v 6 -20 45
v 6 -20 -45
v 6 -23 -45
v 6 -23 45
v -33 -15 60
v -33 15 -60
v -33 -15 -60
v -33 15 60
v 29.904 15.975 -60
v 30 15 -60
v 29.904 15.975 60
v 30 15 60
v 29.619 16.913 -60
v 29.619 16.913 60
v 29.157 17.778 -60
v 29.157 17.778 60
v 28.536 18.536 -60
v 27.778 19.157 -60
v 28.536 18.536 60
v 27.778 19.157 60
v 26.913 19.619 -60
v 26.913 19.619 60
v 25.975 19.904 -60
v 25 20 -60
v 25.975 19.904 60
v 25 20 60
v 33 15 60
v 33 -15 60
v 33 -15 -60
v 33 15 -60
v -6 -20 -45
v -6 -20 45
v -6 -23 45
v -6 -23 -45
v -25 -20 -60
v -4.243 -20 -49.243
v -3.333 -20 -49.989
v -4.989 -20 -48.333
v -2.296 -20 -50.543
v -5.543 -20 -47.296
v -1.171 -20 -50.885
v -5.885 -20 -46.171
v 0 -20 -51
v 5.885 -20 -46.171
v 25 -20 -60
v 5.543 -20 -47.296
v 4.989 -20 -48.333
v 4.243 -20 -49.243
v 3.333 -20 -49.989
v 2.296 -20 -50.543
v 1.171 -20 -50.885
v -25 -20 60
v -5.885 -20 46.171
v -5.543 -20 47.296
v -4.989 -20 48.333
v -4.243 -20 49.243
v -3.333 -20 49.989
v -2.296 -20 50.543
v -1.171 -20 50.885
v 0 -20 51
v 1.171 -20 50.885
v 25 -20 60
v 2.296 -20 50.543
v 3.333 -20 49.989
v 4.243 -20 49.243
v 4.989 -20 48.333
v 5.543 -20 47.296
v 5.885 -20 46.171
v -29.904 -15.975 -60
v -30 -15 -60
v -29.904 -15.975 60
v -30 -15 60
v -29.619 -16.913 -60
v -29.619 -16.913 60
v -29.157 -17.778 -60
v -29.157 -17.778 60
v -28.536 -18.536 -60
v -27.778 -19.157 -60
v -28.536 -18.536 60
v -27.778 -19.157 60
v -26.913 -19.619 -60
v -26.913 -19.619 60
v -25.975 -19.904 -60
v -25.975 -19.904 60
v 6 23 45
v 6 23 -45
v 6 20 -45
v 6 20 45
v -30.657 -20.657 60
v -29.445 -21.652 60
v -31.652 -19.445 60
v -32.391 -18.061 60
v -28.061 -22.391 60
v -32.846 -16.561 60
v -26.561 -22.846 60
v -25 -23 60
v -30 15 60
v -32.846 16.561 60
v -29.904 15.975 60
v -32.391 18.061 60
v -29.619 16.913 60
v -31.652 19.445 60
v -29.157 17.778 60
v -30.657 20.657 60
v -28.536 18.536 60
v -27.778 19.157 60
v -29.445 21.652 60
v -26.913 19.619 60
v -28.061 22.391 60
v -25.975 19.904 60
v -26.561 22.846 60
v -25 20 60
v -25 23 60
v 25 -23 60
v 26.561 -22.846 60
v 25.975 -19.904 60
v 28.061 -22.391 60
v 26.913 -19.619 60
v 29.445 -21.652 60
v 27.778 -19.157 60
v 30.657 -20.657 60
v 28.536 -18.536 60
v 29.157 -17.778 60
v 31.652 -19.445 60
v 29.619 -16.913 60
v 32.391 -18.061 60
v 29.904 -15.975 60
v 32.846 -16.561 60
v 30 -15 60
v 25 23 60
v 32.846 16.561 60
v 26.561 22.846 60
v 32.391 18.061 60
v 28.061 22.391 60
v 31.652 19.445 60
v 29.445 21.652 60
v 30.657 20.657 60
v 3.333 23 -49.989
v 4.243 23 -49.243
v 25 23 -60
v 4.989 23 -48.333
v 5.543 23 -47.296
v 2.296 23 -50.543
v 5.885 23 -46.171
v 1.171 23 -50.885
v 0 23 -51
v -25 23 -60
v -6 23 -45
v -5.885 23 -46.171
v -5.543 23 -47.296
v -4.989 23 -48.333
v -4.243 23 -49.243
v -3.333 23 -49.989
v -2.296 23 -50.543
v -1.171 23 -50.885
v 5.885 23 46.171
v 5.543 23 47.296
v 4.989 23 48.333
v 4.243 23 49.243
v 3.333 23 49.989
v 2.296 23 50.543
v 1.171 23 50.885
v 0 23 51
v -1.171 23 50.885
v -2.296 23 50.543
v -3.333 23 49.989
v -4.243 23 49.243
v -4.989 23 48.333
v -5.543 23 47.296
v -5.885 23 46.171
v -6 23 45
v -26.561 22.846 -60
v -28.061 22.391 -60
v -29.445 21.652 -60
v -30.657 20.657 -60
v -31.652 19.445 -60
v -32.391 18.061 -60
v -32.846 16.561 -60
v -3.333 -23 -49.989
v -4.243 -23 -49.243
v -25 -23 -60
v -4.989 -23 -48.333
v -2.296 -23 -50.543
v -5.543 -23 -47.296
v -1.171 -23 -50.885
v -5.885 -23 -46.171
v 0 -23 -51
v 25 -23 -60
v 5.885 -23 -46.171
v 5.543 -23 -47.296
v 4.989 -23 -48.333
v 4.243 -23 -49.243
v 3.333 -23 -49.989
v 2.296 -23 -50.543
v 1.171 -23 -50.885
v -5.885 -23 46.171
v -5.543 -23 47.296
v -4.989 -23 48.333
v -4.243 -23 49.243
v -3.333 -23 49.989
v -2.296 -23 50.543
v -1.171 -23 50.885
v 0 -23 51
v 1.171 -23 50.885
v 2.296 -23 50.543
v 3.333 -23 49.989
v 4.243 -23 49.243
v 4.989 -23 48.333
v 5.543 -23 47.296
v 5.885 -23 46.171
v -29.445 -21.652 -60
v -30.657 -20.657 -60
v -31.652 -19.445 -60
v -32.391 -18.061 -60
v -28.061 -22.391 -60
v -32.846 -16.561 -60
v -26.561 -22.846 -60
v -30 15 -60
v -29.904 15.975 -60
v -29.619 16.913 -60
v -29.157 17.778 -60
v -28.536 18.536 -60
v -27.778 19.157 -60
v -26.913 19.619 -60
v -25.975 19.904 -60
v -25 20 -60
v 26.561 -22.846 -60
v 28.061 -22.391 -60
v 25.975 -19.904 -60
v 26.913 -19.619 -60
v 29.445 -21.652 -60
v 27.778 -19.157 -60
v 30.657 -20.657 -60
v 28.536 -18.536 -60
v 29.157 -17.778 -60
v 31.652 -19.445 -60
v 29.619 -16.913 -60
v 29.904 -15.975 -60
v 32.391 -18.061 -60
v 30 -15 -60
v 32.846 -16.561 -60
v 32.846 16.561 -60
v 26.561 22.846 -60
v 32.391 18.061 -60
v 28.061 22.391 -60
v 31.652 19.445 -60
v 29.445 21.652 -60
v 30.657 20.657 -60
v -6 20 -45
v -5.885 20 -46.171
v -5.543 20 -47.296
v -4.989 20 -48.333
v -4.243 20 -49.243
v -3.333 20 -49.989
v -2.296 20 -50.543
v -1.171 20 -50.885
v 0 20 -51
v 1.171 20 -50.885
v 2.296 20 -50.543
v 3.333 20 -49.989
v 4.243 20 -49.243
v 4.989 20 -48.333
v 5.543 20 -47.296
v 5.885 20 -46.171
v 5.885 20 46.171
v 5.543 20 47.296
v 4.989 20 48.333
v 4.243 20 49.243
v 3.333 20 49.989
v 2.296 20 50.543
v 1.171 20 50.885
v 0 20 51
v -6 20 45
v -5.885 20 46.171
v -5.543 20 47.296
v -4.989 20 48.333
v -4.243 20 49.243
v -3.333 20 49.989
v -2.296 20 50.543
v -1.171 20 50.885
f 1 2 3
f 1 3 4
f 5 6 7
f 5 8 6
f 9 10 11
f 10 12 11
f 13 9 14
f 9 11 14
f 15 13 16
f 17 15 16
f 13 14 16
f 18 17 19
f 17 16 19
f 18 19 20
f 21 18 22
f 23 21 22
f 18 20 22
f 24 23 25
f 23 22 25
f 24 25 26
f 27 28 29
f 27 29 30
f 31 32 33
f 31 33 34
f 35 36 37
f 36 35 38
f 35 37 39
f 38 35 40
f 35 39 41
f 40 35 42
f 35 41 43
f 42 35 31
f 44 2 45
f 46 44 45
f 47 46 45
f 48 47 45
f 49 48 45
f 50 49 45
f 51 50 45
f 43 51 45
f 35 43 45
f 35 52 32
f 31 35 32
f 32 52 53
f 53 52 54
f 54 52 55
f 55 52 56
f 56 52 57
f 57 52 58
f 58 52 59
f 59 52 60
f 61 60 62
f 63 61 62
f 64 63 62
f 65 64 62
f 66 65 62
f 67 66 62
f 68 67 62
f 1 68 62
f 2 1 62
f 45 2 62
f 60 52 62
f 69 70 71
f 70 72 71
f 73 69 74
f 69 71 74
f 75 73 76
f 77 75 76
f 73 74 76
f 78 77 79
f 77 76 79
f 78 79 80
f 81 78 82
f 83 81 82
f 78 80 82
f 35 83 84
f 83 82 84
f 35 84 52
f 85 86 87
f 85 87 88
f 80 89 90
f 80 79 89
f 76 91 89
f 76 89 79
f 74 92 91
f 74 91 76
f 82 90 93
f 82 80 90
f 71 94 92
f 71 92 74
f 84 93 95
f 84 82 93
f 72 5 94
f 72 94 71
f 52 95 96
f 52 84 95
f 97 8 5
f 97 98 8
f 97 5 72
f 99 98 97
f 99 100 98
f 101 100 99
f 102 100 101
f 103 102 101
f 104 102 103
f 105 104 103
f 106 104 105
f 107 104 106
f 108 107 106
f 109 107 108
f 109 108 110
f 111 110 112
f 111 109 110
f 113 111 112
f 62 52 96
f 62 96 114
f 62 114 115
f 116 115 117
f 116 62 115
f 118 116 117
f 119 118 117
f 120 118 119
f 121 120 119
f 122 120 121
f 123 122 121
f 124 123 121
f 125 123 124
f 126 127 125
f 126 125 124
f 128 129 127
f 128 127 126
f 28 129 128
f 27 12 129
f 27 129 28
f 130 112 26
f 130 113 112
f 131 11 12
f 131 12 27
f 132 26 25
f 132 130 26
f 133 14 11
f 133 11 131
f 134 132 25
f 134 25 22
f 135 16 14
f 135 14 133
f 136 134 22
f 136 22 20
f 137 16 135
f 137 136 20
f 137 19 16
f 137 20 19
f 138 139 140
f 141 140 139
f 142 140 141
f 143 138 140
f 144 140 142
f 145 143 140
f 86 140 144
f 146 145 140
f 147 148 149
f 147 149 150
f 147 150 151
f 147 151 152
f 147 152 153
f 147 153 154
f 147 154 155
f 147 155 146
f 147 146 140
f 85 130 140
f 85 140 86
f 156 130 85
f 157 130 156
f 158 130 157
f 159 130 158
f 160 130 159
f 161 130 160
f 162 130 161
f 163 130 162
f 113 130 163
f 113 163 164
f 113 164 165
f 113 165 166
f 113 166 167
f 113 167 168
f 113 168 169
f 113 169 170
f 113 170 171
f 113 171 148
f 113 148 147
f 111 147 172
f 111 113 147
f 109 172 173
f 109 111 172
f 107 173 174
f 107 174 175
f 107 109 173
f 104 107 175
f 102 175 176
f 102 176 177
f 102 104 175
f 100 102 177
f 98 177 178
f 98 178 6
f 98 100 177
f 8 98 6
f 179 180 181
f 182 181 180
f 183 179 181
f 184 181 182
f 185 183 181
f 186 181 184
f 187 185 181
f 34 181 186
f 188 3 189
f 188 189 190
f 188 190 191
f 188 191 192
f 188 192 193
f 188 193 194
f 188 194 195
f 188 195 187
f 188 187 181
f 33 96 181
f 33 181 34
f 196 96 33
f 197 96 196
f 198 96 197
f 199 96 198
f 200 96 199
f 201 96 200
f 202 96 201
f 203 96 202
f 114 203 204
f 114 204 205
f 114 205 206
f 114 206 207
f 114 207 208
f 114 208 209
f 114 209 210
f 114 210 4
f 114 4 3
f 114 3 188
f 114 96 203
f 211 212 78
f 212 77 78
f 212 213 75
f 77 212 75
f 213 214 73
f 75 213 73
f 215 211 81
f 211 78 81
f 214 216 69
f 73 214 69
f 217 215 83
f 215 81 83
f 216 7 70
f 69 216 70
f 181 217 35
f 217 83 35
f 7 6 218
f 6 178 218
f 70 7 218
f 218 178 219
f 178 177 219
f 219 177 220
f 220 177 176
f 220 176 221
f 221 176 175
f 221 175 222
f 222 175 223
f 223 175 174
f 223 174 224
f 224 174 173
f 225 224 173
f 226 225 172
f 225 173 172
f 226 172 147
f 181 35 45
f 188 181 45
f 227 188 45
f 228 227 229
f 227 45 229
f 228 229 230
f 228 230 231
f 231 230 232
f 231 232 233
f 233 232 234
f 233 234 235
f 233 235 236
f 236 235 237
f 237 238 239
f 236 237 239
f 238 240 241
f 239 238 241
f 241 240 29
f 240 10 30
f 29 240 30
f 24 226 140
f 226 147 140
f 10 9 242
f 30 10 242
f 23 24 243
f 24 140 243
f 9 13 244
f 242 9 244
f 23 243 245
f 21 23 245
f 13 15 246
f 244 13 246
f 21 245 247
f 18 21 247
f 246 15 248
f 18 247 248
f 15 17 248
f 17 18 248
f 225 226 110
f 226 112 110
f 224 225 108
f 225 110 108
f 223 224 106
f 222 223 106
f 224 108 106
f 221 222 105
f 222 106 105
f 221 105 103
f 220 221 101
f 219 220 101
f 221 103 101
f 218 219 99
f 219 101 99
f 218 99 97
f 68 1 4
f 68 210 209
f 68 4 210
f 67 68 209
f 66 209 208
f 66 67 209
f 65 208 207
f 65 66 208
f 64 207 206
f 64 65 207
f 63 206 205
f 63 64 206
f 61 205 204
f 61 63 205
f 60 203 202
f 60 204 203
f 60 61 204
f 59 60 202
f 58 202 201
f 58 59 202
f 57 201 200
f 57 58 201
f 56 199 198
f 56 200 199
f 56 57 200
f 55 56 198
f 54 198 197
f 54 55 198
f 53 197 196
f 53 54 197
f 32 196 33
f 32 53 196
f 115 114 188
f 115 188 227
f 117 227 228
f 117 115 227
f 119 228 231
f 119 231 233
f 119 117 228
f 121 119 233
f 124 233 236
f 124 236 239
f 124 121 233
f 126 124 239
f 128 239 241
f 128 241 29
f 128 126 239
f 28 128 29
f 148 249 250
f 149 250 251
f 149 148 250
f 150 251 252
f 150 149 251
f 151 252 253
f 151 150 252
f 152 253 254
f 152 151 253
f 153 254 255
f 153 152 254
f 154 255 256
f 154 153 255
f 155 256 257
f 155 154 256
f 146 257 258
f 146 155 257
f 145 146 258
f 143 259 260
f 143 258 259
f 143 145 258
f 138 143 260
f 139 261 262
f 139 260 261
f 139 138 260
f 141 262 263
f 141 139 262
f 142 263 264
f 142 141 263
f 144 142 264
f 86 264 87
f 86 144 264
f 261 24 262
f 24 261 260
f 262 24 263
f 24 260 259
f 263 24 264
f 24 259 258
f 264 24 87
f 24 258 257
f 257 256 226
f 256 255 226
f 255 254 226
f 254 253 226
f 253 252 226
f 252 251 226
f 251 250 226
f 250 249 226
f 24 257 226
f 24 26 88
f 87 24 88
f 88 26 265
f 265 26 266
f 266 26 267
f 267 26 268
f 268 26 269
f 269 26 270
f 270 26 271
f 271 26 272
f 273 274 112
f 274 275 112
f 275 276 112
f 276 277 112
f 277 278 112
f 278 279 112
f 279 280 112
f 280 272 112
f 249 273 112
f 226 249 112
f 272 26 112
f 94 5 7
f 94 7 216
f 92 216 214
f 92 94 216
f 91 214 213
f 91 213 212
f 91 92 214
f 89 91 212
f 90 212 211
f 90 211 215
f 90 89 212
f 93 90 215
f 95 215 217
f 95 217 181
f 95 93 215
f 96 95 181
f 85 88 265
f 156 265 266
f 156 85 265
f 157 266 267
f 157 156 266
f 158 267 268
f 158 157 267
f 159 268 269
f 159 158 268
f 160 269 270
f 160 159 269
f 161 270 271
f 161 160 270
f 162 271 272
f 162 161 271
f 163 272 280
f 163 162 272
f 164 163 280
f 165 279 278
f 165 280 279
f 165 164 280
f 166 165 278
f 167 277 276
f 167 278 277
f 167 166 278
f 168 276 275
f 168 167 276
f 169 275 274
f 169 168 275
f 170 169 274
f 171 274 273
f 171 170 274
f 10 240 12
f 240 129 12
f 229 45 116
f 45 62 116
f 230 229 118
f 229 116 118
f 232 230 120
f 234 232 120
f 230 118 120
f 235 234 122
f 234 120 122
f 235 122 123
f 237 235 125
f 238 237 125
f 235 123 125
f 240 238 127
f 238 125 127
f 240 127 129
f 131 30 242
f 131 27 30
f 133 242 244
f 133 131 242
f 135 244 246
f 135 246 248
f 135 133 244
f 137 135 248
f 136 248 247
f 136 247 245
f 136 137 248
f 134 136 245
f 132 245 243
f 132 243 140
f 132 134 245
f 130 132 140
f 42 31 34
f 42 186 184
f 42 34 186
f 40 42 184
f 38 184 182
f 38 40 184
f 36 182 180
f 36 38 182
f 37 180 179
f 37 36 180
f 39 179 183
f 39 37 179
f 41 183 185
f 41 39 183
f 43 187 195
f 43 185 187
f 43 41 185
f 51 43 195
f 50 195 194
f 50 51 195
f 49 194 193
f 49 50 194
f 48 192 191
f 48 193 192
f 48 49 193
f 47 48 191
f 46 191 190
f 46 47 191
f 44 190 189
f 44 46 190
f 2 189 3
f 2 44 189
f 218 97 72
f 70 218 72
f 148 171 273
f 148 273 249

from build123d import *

# Parameters (mm, degrees)
EXTRUDE_THIN1_DEPTH     = 60
CUT_EXTRUDE1_DEPTH      = 1
CUT_EXTRUDE1_DEPTH_BACK = 47


with BuildPart() as part:
    # Sketch1 → Extrude-Thin1 (new body, symmetric)
    with BuildSketch(Plane.XY):
        with BuildLine():
            Line((-33, 15), (-33, -15))
            ThreePointArc((-33, -15), (-30.656854249, -20.656854249), (-25, -23))
            Line((-25, -23), (25, -23))
            ThreePointArc((25, -23), (30.656854249, -20.656854249), (33, -15))
            Line((33, -15), (33, 15))
            ThreePointArc((33, 15), (30.656854249, 20.656854249), (25, 23))
            Line((25, 23), (-25, 23))
            ThreePointArc((-25, 23), (-30.656854249, 20.656854249), (-33, 15))
        make_face()
        with BuildLine():
            Line((-30, 15), (-30, -15))
            ThreePointArc((-30, -15), (-28.535533906, -18.535533906), (-25, -20))
            Line((-25, -20), (25, -20))
            ThreePointArc((25, -20), (28.535533906, -18.535533906), (30, -15))
            Line((30, -15), (30, 15))
            ThreePointArc((30, 15), (28.535533906, 18.535533906), (25, 20))
            Line((25, 20), (-25, 20))
            ThreePointArc((-25, 20), (-28.535533906, 18.535533906), (-30, 15))
        make_face(mode=Mode.SUBTRACT)
    extrude(amount=EXTRUDE_THIN1_DEPTH, both=True)

    # Sketch2 → Cut-Extrude1 (cut, two sides)
    with BuildSketch(Plane(origin=(0, 23, 0), x_dir=(1, 0, 0), z_dir=(0, 1, 0))) as cut_extrude1_sk:
        with BuildLine():
            Line((6, 45), (6, -45))
            ThreePointArc((6, -45), (0, -51), (-6, -45))
            Line((-6, -45), (-6, 45))
            ThreePointArc((-6, 45), (0, 51), (6, 45))
        make_face()
    extrude(amount=CUT_EXTRUDE1_DEPTH, mode=Mode.SUBTRACT)
    extrude(cut_extrude1_sk.sketch, amount=-CUT_EXTRUDE1_DEPTH_BACK, mode=Mode.SUBTRACT)


solid = part.part
